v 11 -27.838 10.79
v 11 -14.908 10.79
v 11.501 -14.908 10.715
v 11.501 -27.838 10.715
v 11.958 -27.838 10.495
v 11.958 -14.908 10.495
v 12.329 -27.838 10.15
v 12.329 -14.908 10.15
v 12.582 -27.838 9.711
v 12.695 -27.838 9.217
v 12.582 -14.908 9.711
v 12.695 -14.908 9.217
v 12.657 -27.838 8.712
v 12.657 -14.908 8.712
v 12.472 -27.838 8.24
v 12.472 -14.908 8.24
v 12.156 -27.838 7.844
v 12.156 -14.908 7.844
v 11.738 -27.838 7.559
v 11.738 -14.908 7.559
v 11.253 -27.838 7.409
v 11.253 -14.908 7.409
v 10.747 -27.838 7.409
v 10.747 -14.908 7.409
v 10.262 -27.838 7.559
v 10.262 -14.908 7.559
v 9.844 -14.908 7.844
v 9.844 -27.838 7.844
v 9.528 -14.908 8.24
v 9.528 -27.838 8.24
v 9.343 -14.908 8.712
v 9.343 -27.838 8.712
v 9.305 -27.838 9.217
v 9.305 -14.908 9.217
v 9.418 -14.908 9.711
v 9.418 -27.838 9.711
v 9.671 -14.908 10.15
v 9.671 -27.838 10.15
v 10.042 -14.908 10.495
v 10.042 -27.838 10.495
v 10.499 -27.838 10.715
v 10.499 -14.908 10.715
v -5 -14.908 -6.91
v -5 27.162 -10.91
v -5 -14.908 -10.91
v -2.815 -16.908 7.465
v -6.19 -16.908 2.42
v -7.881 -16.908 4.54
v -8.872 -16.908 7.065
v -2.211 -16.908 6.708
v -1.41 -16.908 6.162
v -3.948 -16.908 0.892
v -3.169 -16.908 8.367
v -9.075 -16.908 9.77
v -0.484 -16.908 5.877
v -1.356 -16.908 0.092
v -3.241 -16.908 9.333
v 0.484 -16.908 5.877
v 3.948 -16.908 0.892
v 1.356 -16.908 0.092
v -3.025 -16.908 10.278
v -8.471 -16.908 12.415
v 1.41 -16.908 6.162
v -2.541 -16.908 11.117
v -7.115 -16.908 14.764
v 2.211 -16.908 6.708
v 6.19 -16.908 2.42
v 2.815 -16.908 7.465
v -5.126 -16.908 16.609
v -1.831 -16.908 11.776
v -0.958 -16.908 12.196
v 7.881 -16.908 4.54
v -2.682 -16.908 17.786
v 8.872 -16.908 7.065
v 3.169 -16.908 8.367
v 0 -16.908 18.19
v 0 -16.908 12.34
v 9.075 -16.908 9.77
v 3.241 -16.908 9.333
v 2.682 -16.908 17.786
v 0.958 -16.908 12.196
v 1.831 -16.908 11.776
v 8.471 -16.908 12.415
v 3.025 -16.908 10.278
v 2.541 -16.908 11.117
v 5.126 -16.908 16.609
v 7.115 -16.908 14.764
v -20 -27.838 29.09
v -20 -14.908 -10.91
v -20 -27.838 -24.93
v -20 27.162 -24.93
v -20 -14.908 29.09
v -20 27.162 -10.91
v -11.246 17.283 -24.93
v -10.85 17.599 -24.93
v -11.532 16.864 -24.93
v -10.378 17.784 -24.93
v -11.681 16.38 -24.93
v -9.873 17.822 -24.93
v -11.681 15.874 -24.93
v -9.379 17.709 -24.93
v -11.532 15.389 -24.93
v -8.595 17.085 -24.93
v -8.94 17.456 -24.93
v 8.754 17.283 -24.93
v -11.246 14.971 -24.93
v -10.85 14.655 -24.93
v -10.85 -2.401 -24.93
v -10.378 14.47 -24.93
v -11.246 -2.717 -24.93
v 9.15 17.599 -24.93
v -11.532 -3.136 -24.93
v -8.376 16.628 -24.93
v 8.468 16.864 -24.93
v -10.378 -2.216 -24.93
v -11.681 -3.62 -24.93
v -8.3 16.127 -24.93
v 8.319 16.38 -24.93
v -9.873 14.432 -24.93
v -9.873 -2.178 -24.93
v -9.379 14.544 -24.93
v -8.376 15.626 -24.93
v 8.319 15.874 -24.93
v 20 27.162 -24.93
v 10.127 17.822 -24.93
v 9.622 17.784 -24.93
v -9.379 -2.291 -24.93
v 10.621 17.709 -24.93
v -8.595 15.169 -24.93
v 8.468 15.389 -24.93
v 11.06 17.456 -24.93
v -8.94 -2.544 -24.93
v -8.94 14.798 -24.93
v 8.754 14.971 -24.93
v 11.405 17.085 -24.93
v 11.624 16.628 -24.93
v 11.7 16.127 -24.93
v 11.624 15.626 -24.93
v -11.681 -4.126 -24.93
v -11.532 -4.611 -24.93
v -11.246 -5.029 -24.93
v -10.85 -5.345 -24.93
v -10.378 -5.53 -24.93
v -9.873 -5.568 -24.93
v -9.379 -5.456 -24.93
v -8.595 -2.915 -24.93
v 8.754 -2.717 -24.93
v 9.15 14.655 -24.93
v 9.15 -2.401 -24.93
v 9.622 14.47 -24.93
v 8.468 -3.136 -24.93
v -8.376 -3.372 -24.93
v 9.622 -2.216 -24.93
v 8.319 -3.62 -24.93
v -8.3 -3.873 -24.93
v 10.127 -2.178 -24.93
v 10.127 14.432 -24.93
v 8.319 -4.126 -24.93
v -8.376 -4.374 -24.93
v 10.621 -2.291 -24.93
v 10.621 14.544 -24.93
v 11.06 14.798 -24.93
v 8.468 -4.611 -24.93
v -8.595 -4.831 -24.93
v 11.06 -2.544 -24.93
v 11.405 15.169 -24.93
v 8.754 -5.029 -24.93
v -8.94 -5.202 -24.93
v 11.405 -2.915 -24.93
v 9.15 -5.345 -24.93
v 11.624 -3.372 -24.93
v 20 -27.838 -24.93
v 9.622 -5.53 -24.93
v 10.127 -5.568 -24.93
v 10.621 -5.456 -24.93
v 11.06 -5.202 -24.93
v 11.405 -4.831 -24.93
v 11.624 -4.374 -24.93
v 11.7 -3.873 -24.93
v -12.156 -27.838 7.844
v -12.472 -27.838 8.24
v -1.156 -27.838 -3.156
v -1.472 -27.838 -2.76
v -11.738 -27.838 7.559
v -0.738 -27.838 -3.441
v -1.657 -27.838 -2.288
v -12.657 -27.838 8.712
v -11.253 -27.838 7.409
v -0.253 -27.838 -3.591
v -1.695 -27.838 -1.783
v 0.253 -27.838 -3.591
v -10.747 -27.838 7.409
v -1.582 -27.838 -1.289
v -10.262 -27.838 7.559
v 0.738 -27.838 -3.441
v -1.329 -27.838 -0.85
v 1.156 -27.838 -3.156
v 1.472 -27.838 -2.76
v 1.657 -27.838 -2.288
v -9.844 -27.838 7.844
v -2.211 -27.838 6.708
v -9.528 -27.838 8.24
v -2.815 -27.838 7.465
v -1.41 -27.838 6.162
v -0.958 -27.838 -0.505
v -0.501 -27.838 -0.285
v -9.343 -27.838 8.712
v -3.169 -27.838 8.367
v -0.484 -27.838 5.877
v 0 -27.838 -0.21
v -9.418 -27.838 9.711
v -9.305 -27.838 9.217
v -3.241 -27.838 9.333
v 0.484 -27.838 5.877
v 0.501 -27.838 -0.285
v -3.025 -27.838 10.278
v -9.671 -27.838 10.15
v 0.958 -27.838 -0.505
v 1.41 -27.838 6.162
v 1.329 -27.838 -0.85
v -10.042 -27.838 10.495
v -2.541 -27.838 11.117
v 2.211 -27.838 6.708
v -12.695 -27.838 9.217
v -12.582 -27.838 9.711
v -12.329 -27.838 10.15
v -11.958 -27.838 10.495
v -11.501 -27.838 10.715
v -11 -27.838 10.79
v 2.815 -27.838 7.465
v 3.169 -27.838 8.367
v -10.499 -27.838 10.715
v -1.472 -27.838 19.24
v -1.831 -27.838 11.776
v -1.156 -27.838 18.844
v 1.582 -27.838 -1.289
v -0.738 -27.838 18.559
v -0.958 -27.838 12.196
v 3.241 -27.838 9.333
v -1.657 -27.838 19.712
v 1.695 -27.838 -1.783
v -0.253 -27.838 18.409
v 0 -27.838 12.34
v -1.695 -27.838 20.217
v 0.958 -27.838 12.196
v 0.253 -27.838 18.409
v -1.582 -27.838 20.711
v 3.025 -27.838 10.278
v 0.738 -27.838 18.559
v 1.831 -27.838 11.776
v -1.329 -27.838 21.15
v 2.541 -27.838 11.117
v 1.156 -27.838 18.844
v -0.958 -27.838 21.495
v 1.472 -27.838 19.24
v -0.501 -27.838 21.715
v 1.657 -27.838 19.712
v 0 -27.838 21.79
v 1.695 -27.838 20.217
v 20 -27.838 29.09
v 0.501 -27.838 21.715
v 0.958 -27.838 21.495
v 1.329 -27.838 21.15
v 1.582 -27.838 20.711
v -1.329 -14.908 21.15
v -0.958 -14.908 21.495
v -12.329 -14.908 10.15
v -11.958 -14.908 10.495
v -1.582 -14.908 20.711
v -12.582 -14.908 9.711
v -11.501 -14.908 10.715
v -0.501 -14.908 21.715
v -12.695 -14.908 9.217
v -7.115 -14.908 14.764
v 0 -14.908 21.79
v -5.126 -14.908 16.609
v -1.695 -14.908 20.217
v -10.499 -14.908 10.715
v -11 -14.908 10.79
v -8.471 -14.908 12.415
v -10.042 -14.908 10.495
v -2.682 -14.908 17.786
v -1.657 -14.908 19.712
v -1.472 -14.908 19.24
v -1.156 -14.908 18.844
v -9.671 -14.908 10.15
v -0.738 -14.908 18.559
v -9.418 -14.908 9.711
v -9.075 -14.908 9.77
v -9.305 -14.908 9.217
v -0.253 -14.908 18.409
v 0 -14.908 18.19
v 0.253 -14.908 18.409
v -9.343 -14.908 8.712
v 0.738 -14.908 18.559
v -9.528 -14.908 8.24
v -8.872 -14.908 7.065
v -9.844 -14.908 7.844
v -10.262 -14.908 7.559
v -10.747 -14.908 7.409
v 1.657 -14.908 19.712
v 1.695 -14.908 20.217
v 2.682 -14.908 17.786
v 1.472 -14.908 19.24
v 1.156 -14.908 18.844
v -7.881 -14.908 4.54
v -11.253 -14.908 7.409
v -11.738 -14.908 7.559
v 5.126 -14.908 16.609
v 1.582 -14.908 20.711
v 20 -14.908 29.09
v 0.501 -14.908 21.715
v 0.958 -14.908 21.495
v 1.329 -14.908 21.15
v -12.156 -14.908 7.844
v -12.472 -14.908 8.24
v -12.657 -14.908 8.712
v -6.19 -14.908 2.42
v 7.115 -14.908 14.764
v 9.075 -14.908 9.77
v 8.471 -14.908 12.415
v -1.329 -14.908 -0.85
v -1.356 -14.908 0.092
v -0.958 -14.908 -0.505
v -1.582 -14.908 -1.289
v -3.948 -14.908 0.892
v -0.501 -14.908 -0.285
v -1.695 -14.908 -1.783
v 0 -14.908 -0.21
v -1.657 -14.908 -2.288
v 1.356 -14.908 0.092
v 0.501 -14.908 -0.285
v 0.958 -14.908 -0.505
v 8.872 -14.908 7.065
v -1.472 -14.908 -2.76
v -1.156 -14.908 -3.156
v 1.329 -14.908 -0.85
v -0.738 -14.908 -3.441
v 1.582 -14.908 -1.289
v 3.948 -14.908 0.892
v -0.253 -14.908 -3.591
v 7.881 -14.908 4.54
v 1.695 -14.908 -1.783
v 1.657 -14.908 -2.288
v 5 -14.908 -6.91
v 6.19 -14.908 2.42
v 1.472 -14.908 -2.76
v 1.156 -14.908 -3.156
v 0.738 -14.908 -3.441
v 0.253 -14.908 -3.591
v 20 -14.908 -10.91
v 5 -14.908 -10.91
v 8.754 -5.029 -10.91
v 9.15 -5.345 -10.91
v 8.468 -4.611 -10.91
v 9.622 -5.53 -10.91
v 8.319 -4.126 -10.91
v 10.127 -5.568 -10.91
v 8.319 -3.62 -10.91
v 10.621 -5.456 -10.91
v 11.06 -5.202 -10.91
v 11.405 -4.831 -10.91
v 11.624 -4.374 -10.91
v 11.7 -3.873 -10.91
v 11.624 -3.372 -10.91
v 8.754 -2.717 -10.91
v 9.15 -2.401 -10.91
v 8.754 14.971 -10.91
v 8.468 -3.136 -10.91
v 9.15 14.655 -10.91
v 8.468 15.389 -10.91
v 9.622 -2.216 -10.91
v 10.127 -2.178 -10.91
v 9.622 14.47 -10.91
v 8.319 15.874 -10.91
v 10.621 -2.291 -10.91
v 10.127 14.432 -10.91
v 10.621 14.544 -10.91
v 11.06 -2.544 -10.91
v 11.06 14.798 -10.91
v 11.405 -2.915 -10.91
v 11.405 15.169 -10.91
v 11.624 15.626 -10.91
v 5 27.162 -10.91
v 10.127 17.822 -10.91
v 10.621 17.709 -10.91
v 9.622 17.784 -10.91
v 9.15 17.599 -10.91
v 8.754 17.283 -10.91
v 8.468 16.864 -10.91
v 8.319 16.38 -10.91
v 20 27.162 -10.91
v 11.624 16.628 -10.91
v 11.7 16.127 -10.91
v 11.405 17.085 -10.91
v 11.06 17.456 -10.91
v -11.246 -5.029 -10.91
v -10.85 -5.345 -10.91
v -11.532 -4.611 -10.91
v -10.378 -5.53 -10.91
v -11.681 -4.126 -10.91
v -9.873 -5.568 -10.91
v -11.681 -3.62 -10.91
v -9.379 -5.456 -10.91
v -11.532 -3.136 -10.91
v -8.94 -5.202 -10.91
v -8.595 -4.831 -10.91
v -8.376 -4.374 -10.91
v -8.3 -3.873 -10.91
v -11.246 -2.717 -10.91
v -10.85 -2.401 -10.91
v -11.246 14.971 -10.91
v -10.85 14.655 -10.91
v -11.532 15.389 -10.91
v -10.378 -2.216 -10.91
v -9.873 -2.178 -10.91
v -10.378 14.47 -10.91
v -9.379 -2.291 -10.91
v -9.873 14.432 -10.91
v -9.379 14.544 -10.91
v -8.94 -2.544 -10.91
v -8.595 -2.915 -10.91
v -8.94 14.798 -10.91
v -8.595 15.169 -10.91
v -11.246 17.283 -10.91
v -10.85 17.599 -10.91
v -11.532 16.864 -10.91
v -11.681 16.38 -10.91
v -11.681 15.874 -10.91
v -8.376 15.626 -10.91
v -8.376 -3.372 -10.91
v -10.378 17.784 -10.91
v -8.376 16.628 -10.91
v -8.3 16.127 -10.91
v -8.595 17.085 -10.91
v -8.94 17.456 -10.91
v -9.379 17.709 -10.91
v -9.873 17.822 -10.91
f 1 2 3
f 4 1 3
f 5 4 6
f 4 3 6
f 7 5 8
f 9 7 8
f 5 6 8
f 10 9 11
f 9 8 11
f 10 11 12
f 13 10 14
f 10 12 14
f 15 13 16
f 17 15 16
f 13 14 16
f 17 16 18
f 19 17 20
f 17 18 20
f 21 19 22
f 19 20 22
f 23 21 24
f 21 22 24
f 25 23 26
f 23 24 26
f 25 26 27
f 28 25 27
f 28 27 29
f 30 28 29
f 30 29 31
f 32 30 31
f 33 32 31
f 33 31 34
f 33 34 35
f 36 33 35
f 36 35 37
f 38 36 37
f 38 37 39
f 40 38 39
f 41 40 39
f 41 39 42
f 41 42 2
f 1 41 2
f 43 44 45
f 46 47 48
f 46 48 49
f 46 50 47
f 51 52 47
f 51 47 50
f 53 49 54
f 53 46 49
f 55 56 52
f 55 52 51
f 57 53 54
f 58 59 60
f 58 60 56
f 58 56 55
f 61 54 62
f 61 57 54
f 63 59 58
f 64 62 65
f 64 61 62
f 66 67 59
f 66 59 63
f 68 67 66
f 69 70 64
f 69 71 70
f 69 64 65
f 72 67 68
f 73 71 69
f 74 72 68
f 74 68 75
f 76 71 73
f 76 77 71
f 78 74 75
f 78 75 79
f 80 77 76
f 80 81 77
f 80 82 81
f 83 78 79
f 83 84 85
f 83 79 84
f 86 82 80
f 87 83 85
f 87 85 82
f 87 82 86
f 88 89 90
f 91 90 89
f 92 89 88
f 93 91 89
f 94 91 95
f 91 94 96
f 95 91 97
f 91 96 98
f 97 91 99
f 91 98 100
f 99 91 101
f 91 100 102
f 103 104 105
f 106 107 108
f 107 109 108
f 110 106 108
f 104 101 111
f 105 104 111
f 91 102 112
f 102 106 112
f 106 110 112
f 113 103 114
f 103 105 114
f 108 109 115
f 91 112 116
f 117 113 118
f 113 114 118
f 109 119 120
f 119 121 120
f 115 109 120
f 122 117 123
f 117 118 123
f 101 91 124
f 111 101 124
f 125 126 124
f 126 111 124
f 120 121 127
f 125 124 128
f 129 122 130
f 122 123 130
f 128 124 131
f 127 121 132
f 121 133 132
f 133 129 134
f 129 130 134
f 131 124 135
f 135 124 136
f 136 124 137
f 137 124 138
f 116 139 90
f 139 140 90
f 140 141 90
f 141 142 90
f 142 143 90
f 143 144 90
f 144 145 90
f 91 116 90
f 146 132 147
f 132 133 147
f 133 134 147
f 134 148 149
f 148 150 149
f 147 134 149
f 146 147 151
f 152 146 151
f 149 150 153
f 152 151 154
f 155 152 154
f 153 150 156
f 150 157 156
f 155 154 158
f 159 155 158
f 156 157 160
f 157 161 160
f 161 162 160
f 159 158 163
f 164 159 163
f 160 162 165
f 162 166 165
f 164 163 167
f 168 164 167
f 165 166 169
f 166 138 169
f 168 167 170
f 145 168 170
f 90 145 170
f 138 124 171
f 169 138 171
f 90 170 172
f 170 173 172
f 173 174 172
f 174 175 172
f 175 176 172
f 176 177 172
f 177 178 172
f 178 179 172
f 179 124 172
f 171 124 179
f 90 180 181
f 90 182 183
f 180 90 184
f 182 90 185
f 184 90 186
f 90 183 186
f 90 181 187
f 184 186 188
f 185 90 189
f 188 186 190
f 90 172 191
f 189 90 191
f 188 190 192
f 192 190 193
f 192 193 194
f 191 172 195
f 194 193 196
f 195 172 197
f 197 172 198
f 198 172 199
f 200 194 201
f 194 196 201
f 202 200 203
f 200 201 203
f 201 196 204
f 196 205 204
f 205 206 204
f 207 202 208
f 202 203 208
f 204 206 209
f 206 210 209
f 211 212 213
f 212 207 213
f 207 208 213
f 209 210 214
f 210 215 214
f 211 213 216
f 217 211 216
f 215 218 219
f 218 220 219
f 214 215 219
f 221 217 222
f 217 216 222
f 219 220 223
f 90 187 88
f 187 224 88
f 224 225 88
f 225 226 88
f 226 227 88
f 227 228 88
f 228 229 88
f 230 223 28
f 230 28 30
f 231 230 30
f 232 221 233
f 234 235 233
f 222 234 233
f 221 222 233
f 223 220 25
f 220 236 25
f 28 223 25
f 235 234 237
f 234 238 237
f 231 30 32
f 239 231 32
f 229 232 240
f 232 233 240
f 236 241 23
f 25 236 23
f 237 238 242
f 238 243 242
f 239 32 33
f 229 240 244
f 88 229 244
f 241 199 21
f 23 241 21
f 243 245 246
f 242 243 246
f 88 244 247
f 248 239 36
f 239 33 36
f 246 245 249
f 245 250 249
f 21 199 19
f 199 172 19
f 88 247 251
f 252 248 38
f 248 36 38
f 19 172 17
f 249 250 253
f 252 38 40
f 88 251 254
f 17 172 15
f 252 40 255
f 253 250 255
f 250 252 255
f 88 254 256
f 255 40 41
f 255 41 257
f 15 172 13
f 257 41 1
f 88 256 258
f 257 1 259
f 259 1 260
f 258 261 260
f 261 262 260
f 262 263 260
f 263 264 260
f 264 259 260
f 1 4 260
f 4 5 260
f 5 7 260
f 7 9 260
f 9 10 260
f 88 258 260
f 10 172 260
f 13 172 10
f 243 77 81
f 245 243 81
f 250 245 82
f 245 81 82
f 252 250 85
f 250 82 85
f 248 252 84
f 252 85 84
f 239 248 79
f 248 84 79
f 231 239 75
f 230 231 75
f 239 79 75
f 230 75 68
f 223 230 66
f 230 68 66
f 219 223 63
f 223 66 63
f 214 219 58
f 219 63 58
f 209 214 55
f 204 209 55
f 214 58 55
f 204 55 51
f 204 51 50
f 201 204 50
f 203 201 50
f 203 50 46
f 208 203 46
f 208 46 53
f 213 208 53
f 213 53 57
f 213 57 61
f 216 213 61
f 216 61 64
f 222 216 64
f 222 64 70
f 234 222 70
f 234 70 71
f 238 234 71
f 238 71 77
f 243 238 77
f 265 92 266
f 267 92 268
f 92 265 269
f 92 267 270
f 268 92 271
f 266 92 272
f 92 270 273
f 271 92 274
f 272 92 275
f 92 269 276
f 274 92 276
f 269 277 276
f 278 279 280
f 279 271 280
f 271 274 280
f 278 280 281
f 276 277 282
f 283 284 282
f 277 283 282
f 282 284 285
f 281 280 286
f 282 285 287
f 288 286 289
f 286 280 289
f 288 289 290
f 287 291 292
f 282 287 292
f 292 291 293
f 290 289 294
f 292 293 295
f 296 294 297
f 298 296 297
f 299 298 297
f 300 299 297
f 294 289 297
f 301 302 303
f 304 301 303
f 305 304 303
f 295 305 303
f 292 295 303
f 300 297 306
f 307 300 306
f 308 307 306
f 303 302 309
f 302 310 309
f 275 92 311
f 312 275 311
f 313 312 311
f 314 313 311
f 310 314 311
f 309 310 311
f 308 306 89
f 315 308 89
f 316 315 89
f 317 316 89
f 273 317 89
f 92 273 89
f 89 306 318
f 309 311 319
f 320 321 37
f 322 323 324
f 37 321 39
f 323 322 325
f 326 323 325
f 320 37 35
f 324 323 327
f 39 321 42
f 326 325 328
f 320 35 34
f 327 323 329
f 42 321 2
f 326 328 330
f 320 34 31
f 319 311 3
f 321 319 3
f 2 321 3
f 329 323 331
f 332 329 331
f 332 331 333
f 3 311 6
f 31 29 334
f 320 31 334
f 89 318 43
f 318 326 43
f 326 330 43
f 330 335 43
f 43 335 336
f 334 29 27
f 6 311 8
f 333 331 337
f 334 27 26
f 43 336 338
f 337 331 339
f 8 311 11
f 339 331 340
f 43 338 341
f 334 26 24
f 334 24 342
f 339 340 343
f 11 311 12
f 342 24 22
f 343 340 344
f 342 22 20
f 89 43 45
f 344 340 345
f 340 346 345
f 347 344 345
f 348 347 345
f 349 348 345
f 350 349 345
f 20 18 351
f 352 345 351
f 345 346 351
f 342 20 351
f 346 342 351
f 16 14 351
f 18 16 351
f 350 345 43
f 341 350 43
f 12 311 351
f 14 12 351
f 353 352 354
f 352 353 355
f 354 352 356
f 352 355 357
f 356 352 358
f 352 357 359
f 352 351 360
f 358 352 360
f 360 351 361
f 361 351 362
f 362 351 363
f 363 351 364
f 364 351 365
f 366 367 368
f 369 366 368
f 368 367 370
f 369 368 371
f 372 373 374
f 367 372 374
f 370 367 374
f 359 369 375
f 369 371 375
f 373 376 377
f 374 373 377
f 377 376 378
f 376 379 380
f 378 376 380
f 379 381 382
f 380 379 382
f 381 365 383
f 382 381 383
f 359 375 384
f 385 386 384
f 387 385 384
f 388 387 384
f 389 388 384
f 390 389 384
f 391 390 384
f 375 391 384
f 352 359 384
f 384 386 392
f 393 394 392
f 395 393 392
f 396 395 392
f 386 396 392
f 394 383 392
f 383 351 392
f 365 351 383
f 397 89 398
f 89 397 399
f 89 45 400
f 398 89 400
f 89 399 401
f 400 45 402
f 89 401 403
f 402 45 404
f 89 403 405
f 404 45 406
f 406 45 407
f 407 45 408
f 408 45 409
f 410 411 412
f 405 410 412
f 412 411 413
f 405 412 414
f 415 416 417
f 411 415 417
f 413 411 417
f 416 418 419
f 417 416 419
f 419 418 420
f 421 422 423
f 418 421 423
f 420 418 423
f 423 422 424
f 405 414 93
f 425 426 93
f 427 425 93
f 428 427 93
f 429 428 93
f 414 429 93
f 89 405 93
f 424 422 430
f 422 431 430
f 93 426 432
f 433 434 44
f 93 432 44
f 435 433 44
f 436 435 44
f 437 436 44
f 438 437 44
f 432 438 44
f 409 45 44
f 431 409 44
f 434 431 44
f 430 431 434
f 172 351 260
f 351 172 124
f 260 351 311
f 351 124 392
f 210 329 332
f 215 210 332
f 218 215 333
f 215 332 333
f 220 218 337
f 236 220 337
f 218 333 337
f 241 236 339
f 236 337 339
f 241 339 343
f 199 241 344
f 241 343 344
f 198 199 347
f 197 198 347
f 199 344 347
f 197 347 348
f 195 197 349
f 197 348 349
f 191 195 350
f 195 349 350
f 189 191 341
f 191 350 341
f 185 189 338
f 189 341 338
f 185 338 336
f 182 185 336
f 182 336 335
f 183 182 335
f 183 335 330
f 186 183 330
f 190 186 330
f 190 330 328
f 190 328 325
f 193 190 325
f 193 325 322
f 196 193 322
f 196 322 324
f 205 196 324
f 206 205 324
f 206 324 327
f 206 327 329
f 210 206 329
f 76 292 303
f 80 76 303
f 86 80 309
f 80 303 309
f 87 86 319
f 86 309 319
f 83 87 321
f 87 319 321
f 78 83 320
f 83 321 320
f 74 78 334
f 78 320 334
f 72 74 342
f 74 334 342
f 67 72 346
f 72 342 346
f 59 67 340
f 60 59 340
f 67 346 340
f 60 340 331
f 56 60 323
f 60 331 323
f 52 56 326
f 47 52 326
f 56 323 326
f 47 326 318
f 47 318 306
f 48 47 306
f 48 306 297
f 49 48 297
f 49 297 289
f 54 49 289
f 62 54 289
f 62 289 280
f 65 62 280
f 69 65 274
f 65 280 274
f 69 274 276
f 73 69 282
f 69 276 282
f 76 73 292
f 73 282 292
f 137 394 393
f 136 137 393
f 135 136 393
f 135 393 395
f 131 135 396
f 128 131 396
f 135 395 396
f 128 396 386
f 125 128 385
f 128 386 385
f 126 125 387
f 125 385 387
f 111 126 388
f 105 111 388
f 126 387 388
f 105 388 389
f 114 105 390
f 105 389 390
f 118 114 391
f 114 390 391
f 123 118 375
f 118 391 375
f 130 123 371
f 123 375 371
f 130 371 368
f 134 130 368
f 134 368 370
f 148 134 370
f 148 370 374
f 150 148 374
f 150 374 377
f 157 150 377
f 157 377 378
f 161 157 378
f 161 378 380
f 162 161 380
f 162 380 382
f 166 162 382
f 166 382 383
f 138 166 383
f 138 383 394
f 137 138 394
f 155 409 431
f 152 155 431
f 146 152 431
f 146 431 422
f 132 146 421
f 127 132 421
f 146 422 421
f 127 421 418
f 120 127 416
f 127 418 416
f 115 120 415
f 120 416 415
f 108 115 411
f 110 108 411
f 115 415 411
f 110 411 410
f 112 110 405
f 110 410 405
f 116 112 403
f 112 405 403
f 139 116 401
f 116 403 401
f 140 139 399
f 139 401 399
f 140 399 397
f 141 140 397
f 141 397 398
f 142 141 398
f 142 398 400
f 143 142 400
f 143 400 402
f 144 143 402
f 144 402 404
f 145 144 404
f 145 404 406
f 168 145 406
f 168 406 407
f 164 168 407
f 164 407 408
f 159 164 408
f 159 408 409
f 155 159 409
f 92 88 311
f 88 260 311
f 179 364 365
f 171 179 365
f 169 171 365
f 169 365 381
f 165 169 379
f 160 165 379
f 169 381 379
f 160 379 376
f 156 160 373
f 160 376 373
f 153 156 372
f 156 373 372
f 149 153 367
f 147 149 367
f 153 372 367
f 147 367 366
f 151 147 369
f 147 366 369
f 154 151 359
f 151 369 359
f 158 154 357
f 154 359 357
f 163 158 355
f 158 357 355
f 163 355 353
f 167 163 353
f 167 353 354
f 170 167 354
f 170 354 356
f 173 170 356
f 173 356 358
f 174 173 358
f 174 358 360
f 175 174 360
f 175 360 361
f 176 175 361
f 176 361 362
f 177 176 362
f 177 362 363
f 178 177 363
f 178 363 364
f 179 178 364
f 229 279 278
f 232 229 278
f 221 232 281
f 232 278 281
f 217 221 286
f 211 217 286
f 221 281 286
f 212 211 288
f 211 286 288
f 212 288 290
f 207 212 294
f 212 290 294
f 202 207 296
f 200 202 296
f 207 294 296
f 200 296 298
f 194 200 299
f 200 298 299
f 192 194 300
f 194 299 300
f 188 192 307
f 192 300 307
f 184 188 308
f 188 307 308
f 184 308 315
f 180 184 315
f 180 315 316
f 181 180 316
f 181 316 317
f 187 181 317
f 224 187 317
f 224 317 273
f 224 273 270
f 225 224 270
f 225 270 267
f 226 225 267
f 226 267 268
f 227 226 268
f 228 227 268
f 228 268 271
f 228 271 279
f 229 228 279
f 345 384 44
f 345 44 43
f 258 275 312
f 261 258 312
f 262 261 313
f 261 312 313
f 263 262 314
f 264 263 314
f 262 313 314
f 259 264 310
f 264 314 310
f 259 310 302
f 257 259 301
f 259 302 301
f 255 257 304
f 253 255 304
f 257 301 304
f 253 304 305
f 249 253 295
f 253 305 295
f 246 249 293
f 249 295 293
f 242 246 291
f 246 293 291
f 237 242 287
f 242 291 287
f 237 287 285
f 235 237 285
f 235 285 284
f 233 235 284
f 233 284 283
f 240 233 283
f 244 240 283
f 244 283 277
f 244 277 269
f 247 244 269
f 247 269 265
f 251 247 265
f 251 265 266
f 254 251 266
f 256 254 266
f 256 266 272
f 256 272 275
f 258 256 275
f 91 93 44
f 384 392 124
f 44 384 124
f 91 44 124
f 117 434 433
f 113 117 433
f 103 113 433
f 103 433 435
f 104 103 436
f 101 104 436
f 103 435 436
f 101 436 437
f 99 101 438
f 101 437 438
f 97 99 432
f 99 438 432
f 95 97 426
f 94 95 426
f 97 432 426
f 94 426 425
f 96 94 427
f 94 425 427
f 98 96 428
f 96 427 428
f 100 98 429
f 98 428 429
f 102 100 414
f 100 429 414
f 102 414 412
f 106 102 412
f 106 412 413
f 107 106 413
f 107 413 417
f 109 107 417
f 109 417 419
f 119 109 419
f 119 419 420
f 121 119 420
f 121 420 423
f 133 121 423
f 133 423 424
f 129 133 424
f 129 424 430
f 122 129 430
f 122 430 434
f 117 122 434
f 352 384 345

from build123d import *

# Parameters (mm, degrees)
BOSS_EXTRUDE1_DEPTH = 20
SKETCH2_R           = 3.25
CUT_EXTRUDE1_DEPTH  = 55.919366752
SKETCH3_R           = 9.1
CUT_EXTRUDE2_DEPTH  = 2
SKETCH4_R           = 1.7
CUT_EXTRUDE3_DEPTH  = 55.919366752
SKETCH5_R           = 1.7
CUT_EXTRUDE4_DEPTH  = 53.677895109
RIB26_REACH         = 46.958
SKETCH15_WALL_W     = 134.175527088
SKETCH15_WALL_H     = 10


with BuildPart() as part:
    # Sketch1 → Boss-Extrude1 (new, symmetric)
    with BuildSketch(Plane(origin=(0, 0, 0), x_dir=(0, 0, -1), z_dir=(1, 0, 0))):
        Polygon((24.929590164, 27.161885246), (24.929590164, -27.838114754), (-29.090409836, -27.838114754), (-29.090409836, -14.908114754), (10.909590164, -14.908114754), (10.909590164, 27.161885246), align=None)
    extrude(amount=BOSS_EXTRUDE1_DEPTH, both=True)

    # Sketch2 → Cut-Extrude1 (cut, through all)
    with BuildSketch(Plane(origin=(0, -14.908114754, 0), x_dir=(1, 0, 0), z_dir=(0, 1, 0))):
        with Locations(Location((0, -9.090409836, 0), (0, 0, 270))):
            Circle(SKETCH2_R)
    extrude(amount=-CUT_EXTRUDE1_DEPTH, mode=Mode.SUBTRACT)

    # Sketch3 → Cut-Extrude2 (cut)
    with BuildSketch(Plane(origin=(0, -14.908114754, 0), x_dir=(1, 0, 0), z_dir=(0, 1, 0))):
        with Locations(Location((0, -9.090409836, 0), (0, 0, 270))):
            Circle(SKETCH3_R)
    extrude(amount=-CUT_EXTRUDE2_DEPTH, mode=Mode.SUBTRACT)

    # Sketch4 → Cut-Extrude3 (cut, through all)
    with BuildSketch(Plane(origin=(0, -14.908114754, 0), x_dir=(1, 0, 0), z_dir=(0, 1, 0))):
        with Locations(Location((0, 1.909590164, 0), (0, 0, 270))):
            Circle(SKETCH4_R)
        with Locations(Location((11, -9.090409836, 0), (0, 0, 270))):
            Circle(SKETCH4_R)
        with Locations(Location((0, -20.090409836, 0), (0, 0, 270))):
            Circle(SKETCH4_R)
        with Locations(Location((-11, -9.090409836, 0), (0, 0, 270))):
            Circle(SKETCH4_R)
    extrude(amount=-CUT_EXTRUDE3_DEPTH, mode=Mode.SUBTRACT)

    # Sketch5 → Cut-Extrude4 (cut, through all)
    with BuildSketch(Plane.XY.offset(-10.909590164)):
        with Locations((-10, 16.126885246)):
            Circle(SKETCH5_R)
        with Locations((10, 16.126885246)):
            Circle(SKETCH5_R)
        with Locations((10, -3.873114754)):
            Circle(SKETCH5_R)
        with Locations((-10, -3.873114754)):
            Circle(SKETCH5_R)
    extrude(amount=-CUT_EXTRUDE4_DEPTH, mode=Mode.SUBTRACT)

    # Sketch15 wall → Rib26 (add, up to next)
    with BuildSketch(Plane(origin=(0, 6.126885246, -8.909590164), x_dir=(0, -0.995510349515, 0.094652754886), z_dir=(0, 0.094652754886, 0.995510349515)), mode=Mode.PRIVATE) as rib26_sk1:
        Rectangle(SKETCH15_WALL_W, SKETCH15_WALL_H)
    rib26_tool1 = extrude(rib26_sk1.sketch, amount=-RIB26_REACH, mode=Mode.PRIVATE) - part.part
    add(rib26_tool1.solids().sort_by_distance((0, 6.126885246, -8.909590164))[0])


solid = part.part
